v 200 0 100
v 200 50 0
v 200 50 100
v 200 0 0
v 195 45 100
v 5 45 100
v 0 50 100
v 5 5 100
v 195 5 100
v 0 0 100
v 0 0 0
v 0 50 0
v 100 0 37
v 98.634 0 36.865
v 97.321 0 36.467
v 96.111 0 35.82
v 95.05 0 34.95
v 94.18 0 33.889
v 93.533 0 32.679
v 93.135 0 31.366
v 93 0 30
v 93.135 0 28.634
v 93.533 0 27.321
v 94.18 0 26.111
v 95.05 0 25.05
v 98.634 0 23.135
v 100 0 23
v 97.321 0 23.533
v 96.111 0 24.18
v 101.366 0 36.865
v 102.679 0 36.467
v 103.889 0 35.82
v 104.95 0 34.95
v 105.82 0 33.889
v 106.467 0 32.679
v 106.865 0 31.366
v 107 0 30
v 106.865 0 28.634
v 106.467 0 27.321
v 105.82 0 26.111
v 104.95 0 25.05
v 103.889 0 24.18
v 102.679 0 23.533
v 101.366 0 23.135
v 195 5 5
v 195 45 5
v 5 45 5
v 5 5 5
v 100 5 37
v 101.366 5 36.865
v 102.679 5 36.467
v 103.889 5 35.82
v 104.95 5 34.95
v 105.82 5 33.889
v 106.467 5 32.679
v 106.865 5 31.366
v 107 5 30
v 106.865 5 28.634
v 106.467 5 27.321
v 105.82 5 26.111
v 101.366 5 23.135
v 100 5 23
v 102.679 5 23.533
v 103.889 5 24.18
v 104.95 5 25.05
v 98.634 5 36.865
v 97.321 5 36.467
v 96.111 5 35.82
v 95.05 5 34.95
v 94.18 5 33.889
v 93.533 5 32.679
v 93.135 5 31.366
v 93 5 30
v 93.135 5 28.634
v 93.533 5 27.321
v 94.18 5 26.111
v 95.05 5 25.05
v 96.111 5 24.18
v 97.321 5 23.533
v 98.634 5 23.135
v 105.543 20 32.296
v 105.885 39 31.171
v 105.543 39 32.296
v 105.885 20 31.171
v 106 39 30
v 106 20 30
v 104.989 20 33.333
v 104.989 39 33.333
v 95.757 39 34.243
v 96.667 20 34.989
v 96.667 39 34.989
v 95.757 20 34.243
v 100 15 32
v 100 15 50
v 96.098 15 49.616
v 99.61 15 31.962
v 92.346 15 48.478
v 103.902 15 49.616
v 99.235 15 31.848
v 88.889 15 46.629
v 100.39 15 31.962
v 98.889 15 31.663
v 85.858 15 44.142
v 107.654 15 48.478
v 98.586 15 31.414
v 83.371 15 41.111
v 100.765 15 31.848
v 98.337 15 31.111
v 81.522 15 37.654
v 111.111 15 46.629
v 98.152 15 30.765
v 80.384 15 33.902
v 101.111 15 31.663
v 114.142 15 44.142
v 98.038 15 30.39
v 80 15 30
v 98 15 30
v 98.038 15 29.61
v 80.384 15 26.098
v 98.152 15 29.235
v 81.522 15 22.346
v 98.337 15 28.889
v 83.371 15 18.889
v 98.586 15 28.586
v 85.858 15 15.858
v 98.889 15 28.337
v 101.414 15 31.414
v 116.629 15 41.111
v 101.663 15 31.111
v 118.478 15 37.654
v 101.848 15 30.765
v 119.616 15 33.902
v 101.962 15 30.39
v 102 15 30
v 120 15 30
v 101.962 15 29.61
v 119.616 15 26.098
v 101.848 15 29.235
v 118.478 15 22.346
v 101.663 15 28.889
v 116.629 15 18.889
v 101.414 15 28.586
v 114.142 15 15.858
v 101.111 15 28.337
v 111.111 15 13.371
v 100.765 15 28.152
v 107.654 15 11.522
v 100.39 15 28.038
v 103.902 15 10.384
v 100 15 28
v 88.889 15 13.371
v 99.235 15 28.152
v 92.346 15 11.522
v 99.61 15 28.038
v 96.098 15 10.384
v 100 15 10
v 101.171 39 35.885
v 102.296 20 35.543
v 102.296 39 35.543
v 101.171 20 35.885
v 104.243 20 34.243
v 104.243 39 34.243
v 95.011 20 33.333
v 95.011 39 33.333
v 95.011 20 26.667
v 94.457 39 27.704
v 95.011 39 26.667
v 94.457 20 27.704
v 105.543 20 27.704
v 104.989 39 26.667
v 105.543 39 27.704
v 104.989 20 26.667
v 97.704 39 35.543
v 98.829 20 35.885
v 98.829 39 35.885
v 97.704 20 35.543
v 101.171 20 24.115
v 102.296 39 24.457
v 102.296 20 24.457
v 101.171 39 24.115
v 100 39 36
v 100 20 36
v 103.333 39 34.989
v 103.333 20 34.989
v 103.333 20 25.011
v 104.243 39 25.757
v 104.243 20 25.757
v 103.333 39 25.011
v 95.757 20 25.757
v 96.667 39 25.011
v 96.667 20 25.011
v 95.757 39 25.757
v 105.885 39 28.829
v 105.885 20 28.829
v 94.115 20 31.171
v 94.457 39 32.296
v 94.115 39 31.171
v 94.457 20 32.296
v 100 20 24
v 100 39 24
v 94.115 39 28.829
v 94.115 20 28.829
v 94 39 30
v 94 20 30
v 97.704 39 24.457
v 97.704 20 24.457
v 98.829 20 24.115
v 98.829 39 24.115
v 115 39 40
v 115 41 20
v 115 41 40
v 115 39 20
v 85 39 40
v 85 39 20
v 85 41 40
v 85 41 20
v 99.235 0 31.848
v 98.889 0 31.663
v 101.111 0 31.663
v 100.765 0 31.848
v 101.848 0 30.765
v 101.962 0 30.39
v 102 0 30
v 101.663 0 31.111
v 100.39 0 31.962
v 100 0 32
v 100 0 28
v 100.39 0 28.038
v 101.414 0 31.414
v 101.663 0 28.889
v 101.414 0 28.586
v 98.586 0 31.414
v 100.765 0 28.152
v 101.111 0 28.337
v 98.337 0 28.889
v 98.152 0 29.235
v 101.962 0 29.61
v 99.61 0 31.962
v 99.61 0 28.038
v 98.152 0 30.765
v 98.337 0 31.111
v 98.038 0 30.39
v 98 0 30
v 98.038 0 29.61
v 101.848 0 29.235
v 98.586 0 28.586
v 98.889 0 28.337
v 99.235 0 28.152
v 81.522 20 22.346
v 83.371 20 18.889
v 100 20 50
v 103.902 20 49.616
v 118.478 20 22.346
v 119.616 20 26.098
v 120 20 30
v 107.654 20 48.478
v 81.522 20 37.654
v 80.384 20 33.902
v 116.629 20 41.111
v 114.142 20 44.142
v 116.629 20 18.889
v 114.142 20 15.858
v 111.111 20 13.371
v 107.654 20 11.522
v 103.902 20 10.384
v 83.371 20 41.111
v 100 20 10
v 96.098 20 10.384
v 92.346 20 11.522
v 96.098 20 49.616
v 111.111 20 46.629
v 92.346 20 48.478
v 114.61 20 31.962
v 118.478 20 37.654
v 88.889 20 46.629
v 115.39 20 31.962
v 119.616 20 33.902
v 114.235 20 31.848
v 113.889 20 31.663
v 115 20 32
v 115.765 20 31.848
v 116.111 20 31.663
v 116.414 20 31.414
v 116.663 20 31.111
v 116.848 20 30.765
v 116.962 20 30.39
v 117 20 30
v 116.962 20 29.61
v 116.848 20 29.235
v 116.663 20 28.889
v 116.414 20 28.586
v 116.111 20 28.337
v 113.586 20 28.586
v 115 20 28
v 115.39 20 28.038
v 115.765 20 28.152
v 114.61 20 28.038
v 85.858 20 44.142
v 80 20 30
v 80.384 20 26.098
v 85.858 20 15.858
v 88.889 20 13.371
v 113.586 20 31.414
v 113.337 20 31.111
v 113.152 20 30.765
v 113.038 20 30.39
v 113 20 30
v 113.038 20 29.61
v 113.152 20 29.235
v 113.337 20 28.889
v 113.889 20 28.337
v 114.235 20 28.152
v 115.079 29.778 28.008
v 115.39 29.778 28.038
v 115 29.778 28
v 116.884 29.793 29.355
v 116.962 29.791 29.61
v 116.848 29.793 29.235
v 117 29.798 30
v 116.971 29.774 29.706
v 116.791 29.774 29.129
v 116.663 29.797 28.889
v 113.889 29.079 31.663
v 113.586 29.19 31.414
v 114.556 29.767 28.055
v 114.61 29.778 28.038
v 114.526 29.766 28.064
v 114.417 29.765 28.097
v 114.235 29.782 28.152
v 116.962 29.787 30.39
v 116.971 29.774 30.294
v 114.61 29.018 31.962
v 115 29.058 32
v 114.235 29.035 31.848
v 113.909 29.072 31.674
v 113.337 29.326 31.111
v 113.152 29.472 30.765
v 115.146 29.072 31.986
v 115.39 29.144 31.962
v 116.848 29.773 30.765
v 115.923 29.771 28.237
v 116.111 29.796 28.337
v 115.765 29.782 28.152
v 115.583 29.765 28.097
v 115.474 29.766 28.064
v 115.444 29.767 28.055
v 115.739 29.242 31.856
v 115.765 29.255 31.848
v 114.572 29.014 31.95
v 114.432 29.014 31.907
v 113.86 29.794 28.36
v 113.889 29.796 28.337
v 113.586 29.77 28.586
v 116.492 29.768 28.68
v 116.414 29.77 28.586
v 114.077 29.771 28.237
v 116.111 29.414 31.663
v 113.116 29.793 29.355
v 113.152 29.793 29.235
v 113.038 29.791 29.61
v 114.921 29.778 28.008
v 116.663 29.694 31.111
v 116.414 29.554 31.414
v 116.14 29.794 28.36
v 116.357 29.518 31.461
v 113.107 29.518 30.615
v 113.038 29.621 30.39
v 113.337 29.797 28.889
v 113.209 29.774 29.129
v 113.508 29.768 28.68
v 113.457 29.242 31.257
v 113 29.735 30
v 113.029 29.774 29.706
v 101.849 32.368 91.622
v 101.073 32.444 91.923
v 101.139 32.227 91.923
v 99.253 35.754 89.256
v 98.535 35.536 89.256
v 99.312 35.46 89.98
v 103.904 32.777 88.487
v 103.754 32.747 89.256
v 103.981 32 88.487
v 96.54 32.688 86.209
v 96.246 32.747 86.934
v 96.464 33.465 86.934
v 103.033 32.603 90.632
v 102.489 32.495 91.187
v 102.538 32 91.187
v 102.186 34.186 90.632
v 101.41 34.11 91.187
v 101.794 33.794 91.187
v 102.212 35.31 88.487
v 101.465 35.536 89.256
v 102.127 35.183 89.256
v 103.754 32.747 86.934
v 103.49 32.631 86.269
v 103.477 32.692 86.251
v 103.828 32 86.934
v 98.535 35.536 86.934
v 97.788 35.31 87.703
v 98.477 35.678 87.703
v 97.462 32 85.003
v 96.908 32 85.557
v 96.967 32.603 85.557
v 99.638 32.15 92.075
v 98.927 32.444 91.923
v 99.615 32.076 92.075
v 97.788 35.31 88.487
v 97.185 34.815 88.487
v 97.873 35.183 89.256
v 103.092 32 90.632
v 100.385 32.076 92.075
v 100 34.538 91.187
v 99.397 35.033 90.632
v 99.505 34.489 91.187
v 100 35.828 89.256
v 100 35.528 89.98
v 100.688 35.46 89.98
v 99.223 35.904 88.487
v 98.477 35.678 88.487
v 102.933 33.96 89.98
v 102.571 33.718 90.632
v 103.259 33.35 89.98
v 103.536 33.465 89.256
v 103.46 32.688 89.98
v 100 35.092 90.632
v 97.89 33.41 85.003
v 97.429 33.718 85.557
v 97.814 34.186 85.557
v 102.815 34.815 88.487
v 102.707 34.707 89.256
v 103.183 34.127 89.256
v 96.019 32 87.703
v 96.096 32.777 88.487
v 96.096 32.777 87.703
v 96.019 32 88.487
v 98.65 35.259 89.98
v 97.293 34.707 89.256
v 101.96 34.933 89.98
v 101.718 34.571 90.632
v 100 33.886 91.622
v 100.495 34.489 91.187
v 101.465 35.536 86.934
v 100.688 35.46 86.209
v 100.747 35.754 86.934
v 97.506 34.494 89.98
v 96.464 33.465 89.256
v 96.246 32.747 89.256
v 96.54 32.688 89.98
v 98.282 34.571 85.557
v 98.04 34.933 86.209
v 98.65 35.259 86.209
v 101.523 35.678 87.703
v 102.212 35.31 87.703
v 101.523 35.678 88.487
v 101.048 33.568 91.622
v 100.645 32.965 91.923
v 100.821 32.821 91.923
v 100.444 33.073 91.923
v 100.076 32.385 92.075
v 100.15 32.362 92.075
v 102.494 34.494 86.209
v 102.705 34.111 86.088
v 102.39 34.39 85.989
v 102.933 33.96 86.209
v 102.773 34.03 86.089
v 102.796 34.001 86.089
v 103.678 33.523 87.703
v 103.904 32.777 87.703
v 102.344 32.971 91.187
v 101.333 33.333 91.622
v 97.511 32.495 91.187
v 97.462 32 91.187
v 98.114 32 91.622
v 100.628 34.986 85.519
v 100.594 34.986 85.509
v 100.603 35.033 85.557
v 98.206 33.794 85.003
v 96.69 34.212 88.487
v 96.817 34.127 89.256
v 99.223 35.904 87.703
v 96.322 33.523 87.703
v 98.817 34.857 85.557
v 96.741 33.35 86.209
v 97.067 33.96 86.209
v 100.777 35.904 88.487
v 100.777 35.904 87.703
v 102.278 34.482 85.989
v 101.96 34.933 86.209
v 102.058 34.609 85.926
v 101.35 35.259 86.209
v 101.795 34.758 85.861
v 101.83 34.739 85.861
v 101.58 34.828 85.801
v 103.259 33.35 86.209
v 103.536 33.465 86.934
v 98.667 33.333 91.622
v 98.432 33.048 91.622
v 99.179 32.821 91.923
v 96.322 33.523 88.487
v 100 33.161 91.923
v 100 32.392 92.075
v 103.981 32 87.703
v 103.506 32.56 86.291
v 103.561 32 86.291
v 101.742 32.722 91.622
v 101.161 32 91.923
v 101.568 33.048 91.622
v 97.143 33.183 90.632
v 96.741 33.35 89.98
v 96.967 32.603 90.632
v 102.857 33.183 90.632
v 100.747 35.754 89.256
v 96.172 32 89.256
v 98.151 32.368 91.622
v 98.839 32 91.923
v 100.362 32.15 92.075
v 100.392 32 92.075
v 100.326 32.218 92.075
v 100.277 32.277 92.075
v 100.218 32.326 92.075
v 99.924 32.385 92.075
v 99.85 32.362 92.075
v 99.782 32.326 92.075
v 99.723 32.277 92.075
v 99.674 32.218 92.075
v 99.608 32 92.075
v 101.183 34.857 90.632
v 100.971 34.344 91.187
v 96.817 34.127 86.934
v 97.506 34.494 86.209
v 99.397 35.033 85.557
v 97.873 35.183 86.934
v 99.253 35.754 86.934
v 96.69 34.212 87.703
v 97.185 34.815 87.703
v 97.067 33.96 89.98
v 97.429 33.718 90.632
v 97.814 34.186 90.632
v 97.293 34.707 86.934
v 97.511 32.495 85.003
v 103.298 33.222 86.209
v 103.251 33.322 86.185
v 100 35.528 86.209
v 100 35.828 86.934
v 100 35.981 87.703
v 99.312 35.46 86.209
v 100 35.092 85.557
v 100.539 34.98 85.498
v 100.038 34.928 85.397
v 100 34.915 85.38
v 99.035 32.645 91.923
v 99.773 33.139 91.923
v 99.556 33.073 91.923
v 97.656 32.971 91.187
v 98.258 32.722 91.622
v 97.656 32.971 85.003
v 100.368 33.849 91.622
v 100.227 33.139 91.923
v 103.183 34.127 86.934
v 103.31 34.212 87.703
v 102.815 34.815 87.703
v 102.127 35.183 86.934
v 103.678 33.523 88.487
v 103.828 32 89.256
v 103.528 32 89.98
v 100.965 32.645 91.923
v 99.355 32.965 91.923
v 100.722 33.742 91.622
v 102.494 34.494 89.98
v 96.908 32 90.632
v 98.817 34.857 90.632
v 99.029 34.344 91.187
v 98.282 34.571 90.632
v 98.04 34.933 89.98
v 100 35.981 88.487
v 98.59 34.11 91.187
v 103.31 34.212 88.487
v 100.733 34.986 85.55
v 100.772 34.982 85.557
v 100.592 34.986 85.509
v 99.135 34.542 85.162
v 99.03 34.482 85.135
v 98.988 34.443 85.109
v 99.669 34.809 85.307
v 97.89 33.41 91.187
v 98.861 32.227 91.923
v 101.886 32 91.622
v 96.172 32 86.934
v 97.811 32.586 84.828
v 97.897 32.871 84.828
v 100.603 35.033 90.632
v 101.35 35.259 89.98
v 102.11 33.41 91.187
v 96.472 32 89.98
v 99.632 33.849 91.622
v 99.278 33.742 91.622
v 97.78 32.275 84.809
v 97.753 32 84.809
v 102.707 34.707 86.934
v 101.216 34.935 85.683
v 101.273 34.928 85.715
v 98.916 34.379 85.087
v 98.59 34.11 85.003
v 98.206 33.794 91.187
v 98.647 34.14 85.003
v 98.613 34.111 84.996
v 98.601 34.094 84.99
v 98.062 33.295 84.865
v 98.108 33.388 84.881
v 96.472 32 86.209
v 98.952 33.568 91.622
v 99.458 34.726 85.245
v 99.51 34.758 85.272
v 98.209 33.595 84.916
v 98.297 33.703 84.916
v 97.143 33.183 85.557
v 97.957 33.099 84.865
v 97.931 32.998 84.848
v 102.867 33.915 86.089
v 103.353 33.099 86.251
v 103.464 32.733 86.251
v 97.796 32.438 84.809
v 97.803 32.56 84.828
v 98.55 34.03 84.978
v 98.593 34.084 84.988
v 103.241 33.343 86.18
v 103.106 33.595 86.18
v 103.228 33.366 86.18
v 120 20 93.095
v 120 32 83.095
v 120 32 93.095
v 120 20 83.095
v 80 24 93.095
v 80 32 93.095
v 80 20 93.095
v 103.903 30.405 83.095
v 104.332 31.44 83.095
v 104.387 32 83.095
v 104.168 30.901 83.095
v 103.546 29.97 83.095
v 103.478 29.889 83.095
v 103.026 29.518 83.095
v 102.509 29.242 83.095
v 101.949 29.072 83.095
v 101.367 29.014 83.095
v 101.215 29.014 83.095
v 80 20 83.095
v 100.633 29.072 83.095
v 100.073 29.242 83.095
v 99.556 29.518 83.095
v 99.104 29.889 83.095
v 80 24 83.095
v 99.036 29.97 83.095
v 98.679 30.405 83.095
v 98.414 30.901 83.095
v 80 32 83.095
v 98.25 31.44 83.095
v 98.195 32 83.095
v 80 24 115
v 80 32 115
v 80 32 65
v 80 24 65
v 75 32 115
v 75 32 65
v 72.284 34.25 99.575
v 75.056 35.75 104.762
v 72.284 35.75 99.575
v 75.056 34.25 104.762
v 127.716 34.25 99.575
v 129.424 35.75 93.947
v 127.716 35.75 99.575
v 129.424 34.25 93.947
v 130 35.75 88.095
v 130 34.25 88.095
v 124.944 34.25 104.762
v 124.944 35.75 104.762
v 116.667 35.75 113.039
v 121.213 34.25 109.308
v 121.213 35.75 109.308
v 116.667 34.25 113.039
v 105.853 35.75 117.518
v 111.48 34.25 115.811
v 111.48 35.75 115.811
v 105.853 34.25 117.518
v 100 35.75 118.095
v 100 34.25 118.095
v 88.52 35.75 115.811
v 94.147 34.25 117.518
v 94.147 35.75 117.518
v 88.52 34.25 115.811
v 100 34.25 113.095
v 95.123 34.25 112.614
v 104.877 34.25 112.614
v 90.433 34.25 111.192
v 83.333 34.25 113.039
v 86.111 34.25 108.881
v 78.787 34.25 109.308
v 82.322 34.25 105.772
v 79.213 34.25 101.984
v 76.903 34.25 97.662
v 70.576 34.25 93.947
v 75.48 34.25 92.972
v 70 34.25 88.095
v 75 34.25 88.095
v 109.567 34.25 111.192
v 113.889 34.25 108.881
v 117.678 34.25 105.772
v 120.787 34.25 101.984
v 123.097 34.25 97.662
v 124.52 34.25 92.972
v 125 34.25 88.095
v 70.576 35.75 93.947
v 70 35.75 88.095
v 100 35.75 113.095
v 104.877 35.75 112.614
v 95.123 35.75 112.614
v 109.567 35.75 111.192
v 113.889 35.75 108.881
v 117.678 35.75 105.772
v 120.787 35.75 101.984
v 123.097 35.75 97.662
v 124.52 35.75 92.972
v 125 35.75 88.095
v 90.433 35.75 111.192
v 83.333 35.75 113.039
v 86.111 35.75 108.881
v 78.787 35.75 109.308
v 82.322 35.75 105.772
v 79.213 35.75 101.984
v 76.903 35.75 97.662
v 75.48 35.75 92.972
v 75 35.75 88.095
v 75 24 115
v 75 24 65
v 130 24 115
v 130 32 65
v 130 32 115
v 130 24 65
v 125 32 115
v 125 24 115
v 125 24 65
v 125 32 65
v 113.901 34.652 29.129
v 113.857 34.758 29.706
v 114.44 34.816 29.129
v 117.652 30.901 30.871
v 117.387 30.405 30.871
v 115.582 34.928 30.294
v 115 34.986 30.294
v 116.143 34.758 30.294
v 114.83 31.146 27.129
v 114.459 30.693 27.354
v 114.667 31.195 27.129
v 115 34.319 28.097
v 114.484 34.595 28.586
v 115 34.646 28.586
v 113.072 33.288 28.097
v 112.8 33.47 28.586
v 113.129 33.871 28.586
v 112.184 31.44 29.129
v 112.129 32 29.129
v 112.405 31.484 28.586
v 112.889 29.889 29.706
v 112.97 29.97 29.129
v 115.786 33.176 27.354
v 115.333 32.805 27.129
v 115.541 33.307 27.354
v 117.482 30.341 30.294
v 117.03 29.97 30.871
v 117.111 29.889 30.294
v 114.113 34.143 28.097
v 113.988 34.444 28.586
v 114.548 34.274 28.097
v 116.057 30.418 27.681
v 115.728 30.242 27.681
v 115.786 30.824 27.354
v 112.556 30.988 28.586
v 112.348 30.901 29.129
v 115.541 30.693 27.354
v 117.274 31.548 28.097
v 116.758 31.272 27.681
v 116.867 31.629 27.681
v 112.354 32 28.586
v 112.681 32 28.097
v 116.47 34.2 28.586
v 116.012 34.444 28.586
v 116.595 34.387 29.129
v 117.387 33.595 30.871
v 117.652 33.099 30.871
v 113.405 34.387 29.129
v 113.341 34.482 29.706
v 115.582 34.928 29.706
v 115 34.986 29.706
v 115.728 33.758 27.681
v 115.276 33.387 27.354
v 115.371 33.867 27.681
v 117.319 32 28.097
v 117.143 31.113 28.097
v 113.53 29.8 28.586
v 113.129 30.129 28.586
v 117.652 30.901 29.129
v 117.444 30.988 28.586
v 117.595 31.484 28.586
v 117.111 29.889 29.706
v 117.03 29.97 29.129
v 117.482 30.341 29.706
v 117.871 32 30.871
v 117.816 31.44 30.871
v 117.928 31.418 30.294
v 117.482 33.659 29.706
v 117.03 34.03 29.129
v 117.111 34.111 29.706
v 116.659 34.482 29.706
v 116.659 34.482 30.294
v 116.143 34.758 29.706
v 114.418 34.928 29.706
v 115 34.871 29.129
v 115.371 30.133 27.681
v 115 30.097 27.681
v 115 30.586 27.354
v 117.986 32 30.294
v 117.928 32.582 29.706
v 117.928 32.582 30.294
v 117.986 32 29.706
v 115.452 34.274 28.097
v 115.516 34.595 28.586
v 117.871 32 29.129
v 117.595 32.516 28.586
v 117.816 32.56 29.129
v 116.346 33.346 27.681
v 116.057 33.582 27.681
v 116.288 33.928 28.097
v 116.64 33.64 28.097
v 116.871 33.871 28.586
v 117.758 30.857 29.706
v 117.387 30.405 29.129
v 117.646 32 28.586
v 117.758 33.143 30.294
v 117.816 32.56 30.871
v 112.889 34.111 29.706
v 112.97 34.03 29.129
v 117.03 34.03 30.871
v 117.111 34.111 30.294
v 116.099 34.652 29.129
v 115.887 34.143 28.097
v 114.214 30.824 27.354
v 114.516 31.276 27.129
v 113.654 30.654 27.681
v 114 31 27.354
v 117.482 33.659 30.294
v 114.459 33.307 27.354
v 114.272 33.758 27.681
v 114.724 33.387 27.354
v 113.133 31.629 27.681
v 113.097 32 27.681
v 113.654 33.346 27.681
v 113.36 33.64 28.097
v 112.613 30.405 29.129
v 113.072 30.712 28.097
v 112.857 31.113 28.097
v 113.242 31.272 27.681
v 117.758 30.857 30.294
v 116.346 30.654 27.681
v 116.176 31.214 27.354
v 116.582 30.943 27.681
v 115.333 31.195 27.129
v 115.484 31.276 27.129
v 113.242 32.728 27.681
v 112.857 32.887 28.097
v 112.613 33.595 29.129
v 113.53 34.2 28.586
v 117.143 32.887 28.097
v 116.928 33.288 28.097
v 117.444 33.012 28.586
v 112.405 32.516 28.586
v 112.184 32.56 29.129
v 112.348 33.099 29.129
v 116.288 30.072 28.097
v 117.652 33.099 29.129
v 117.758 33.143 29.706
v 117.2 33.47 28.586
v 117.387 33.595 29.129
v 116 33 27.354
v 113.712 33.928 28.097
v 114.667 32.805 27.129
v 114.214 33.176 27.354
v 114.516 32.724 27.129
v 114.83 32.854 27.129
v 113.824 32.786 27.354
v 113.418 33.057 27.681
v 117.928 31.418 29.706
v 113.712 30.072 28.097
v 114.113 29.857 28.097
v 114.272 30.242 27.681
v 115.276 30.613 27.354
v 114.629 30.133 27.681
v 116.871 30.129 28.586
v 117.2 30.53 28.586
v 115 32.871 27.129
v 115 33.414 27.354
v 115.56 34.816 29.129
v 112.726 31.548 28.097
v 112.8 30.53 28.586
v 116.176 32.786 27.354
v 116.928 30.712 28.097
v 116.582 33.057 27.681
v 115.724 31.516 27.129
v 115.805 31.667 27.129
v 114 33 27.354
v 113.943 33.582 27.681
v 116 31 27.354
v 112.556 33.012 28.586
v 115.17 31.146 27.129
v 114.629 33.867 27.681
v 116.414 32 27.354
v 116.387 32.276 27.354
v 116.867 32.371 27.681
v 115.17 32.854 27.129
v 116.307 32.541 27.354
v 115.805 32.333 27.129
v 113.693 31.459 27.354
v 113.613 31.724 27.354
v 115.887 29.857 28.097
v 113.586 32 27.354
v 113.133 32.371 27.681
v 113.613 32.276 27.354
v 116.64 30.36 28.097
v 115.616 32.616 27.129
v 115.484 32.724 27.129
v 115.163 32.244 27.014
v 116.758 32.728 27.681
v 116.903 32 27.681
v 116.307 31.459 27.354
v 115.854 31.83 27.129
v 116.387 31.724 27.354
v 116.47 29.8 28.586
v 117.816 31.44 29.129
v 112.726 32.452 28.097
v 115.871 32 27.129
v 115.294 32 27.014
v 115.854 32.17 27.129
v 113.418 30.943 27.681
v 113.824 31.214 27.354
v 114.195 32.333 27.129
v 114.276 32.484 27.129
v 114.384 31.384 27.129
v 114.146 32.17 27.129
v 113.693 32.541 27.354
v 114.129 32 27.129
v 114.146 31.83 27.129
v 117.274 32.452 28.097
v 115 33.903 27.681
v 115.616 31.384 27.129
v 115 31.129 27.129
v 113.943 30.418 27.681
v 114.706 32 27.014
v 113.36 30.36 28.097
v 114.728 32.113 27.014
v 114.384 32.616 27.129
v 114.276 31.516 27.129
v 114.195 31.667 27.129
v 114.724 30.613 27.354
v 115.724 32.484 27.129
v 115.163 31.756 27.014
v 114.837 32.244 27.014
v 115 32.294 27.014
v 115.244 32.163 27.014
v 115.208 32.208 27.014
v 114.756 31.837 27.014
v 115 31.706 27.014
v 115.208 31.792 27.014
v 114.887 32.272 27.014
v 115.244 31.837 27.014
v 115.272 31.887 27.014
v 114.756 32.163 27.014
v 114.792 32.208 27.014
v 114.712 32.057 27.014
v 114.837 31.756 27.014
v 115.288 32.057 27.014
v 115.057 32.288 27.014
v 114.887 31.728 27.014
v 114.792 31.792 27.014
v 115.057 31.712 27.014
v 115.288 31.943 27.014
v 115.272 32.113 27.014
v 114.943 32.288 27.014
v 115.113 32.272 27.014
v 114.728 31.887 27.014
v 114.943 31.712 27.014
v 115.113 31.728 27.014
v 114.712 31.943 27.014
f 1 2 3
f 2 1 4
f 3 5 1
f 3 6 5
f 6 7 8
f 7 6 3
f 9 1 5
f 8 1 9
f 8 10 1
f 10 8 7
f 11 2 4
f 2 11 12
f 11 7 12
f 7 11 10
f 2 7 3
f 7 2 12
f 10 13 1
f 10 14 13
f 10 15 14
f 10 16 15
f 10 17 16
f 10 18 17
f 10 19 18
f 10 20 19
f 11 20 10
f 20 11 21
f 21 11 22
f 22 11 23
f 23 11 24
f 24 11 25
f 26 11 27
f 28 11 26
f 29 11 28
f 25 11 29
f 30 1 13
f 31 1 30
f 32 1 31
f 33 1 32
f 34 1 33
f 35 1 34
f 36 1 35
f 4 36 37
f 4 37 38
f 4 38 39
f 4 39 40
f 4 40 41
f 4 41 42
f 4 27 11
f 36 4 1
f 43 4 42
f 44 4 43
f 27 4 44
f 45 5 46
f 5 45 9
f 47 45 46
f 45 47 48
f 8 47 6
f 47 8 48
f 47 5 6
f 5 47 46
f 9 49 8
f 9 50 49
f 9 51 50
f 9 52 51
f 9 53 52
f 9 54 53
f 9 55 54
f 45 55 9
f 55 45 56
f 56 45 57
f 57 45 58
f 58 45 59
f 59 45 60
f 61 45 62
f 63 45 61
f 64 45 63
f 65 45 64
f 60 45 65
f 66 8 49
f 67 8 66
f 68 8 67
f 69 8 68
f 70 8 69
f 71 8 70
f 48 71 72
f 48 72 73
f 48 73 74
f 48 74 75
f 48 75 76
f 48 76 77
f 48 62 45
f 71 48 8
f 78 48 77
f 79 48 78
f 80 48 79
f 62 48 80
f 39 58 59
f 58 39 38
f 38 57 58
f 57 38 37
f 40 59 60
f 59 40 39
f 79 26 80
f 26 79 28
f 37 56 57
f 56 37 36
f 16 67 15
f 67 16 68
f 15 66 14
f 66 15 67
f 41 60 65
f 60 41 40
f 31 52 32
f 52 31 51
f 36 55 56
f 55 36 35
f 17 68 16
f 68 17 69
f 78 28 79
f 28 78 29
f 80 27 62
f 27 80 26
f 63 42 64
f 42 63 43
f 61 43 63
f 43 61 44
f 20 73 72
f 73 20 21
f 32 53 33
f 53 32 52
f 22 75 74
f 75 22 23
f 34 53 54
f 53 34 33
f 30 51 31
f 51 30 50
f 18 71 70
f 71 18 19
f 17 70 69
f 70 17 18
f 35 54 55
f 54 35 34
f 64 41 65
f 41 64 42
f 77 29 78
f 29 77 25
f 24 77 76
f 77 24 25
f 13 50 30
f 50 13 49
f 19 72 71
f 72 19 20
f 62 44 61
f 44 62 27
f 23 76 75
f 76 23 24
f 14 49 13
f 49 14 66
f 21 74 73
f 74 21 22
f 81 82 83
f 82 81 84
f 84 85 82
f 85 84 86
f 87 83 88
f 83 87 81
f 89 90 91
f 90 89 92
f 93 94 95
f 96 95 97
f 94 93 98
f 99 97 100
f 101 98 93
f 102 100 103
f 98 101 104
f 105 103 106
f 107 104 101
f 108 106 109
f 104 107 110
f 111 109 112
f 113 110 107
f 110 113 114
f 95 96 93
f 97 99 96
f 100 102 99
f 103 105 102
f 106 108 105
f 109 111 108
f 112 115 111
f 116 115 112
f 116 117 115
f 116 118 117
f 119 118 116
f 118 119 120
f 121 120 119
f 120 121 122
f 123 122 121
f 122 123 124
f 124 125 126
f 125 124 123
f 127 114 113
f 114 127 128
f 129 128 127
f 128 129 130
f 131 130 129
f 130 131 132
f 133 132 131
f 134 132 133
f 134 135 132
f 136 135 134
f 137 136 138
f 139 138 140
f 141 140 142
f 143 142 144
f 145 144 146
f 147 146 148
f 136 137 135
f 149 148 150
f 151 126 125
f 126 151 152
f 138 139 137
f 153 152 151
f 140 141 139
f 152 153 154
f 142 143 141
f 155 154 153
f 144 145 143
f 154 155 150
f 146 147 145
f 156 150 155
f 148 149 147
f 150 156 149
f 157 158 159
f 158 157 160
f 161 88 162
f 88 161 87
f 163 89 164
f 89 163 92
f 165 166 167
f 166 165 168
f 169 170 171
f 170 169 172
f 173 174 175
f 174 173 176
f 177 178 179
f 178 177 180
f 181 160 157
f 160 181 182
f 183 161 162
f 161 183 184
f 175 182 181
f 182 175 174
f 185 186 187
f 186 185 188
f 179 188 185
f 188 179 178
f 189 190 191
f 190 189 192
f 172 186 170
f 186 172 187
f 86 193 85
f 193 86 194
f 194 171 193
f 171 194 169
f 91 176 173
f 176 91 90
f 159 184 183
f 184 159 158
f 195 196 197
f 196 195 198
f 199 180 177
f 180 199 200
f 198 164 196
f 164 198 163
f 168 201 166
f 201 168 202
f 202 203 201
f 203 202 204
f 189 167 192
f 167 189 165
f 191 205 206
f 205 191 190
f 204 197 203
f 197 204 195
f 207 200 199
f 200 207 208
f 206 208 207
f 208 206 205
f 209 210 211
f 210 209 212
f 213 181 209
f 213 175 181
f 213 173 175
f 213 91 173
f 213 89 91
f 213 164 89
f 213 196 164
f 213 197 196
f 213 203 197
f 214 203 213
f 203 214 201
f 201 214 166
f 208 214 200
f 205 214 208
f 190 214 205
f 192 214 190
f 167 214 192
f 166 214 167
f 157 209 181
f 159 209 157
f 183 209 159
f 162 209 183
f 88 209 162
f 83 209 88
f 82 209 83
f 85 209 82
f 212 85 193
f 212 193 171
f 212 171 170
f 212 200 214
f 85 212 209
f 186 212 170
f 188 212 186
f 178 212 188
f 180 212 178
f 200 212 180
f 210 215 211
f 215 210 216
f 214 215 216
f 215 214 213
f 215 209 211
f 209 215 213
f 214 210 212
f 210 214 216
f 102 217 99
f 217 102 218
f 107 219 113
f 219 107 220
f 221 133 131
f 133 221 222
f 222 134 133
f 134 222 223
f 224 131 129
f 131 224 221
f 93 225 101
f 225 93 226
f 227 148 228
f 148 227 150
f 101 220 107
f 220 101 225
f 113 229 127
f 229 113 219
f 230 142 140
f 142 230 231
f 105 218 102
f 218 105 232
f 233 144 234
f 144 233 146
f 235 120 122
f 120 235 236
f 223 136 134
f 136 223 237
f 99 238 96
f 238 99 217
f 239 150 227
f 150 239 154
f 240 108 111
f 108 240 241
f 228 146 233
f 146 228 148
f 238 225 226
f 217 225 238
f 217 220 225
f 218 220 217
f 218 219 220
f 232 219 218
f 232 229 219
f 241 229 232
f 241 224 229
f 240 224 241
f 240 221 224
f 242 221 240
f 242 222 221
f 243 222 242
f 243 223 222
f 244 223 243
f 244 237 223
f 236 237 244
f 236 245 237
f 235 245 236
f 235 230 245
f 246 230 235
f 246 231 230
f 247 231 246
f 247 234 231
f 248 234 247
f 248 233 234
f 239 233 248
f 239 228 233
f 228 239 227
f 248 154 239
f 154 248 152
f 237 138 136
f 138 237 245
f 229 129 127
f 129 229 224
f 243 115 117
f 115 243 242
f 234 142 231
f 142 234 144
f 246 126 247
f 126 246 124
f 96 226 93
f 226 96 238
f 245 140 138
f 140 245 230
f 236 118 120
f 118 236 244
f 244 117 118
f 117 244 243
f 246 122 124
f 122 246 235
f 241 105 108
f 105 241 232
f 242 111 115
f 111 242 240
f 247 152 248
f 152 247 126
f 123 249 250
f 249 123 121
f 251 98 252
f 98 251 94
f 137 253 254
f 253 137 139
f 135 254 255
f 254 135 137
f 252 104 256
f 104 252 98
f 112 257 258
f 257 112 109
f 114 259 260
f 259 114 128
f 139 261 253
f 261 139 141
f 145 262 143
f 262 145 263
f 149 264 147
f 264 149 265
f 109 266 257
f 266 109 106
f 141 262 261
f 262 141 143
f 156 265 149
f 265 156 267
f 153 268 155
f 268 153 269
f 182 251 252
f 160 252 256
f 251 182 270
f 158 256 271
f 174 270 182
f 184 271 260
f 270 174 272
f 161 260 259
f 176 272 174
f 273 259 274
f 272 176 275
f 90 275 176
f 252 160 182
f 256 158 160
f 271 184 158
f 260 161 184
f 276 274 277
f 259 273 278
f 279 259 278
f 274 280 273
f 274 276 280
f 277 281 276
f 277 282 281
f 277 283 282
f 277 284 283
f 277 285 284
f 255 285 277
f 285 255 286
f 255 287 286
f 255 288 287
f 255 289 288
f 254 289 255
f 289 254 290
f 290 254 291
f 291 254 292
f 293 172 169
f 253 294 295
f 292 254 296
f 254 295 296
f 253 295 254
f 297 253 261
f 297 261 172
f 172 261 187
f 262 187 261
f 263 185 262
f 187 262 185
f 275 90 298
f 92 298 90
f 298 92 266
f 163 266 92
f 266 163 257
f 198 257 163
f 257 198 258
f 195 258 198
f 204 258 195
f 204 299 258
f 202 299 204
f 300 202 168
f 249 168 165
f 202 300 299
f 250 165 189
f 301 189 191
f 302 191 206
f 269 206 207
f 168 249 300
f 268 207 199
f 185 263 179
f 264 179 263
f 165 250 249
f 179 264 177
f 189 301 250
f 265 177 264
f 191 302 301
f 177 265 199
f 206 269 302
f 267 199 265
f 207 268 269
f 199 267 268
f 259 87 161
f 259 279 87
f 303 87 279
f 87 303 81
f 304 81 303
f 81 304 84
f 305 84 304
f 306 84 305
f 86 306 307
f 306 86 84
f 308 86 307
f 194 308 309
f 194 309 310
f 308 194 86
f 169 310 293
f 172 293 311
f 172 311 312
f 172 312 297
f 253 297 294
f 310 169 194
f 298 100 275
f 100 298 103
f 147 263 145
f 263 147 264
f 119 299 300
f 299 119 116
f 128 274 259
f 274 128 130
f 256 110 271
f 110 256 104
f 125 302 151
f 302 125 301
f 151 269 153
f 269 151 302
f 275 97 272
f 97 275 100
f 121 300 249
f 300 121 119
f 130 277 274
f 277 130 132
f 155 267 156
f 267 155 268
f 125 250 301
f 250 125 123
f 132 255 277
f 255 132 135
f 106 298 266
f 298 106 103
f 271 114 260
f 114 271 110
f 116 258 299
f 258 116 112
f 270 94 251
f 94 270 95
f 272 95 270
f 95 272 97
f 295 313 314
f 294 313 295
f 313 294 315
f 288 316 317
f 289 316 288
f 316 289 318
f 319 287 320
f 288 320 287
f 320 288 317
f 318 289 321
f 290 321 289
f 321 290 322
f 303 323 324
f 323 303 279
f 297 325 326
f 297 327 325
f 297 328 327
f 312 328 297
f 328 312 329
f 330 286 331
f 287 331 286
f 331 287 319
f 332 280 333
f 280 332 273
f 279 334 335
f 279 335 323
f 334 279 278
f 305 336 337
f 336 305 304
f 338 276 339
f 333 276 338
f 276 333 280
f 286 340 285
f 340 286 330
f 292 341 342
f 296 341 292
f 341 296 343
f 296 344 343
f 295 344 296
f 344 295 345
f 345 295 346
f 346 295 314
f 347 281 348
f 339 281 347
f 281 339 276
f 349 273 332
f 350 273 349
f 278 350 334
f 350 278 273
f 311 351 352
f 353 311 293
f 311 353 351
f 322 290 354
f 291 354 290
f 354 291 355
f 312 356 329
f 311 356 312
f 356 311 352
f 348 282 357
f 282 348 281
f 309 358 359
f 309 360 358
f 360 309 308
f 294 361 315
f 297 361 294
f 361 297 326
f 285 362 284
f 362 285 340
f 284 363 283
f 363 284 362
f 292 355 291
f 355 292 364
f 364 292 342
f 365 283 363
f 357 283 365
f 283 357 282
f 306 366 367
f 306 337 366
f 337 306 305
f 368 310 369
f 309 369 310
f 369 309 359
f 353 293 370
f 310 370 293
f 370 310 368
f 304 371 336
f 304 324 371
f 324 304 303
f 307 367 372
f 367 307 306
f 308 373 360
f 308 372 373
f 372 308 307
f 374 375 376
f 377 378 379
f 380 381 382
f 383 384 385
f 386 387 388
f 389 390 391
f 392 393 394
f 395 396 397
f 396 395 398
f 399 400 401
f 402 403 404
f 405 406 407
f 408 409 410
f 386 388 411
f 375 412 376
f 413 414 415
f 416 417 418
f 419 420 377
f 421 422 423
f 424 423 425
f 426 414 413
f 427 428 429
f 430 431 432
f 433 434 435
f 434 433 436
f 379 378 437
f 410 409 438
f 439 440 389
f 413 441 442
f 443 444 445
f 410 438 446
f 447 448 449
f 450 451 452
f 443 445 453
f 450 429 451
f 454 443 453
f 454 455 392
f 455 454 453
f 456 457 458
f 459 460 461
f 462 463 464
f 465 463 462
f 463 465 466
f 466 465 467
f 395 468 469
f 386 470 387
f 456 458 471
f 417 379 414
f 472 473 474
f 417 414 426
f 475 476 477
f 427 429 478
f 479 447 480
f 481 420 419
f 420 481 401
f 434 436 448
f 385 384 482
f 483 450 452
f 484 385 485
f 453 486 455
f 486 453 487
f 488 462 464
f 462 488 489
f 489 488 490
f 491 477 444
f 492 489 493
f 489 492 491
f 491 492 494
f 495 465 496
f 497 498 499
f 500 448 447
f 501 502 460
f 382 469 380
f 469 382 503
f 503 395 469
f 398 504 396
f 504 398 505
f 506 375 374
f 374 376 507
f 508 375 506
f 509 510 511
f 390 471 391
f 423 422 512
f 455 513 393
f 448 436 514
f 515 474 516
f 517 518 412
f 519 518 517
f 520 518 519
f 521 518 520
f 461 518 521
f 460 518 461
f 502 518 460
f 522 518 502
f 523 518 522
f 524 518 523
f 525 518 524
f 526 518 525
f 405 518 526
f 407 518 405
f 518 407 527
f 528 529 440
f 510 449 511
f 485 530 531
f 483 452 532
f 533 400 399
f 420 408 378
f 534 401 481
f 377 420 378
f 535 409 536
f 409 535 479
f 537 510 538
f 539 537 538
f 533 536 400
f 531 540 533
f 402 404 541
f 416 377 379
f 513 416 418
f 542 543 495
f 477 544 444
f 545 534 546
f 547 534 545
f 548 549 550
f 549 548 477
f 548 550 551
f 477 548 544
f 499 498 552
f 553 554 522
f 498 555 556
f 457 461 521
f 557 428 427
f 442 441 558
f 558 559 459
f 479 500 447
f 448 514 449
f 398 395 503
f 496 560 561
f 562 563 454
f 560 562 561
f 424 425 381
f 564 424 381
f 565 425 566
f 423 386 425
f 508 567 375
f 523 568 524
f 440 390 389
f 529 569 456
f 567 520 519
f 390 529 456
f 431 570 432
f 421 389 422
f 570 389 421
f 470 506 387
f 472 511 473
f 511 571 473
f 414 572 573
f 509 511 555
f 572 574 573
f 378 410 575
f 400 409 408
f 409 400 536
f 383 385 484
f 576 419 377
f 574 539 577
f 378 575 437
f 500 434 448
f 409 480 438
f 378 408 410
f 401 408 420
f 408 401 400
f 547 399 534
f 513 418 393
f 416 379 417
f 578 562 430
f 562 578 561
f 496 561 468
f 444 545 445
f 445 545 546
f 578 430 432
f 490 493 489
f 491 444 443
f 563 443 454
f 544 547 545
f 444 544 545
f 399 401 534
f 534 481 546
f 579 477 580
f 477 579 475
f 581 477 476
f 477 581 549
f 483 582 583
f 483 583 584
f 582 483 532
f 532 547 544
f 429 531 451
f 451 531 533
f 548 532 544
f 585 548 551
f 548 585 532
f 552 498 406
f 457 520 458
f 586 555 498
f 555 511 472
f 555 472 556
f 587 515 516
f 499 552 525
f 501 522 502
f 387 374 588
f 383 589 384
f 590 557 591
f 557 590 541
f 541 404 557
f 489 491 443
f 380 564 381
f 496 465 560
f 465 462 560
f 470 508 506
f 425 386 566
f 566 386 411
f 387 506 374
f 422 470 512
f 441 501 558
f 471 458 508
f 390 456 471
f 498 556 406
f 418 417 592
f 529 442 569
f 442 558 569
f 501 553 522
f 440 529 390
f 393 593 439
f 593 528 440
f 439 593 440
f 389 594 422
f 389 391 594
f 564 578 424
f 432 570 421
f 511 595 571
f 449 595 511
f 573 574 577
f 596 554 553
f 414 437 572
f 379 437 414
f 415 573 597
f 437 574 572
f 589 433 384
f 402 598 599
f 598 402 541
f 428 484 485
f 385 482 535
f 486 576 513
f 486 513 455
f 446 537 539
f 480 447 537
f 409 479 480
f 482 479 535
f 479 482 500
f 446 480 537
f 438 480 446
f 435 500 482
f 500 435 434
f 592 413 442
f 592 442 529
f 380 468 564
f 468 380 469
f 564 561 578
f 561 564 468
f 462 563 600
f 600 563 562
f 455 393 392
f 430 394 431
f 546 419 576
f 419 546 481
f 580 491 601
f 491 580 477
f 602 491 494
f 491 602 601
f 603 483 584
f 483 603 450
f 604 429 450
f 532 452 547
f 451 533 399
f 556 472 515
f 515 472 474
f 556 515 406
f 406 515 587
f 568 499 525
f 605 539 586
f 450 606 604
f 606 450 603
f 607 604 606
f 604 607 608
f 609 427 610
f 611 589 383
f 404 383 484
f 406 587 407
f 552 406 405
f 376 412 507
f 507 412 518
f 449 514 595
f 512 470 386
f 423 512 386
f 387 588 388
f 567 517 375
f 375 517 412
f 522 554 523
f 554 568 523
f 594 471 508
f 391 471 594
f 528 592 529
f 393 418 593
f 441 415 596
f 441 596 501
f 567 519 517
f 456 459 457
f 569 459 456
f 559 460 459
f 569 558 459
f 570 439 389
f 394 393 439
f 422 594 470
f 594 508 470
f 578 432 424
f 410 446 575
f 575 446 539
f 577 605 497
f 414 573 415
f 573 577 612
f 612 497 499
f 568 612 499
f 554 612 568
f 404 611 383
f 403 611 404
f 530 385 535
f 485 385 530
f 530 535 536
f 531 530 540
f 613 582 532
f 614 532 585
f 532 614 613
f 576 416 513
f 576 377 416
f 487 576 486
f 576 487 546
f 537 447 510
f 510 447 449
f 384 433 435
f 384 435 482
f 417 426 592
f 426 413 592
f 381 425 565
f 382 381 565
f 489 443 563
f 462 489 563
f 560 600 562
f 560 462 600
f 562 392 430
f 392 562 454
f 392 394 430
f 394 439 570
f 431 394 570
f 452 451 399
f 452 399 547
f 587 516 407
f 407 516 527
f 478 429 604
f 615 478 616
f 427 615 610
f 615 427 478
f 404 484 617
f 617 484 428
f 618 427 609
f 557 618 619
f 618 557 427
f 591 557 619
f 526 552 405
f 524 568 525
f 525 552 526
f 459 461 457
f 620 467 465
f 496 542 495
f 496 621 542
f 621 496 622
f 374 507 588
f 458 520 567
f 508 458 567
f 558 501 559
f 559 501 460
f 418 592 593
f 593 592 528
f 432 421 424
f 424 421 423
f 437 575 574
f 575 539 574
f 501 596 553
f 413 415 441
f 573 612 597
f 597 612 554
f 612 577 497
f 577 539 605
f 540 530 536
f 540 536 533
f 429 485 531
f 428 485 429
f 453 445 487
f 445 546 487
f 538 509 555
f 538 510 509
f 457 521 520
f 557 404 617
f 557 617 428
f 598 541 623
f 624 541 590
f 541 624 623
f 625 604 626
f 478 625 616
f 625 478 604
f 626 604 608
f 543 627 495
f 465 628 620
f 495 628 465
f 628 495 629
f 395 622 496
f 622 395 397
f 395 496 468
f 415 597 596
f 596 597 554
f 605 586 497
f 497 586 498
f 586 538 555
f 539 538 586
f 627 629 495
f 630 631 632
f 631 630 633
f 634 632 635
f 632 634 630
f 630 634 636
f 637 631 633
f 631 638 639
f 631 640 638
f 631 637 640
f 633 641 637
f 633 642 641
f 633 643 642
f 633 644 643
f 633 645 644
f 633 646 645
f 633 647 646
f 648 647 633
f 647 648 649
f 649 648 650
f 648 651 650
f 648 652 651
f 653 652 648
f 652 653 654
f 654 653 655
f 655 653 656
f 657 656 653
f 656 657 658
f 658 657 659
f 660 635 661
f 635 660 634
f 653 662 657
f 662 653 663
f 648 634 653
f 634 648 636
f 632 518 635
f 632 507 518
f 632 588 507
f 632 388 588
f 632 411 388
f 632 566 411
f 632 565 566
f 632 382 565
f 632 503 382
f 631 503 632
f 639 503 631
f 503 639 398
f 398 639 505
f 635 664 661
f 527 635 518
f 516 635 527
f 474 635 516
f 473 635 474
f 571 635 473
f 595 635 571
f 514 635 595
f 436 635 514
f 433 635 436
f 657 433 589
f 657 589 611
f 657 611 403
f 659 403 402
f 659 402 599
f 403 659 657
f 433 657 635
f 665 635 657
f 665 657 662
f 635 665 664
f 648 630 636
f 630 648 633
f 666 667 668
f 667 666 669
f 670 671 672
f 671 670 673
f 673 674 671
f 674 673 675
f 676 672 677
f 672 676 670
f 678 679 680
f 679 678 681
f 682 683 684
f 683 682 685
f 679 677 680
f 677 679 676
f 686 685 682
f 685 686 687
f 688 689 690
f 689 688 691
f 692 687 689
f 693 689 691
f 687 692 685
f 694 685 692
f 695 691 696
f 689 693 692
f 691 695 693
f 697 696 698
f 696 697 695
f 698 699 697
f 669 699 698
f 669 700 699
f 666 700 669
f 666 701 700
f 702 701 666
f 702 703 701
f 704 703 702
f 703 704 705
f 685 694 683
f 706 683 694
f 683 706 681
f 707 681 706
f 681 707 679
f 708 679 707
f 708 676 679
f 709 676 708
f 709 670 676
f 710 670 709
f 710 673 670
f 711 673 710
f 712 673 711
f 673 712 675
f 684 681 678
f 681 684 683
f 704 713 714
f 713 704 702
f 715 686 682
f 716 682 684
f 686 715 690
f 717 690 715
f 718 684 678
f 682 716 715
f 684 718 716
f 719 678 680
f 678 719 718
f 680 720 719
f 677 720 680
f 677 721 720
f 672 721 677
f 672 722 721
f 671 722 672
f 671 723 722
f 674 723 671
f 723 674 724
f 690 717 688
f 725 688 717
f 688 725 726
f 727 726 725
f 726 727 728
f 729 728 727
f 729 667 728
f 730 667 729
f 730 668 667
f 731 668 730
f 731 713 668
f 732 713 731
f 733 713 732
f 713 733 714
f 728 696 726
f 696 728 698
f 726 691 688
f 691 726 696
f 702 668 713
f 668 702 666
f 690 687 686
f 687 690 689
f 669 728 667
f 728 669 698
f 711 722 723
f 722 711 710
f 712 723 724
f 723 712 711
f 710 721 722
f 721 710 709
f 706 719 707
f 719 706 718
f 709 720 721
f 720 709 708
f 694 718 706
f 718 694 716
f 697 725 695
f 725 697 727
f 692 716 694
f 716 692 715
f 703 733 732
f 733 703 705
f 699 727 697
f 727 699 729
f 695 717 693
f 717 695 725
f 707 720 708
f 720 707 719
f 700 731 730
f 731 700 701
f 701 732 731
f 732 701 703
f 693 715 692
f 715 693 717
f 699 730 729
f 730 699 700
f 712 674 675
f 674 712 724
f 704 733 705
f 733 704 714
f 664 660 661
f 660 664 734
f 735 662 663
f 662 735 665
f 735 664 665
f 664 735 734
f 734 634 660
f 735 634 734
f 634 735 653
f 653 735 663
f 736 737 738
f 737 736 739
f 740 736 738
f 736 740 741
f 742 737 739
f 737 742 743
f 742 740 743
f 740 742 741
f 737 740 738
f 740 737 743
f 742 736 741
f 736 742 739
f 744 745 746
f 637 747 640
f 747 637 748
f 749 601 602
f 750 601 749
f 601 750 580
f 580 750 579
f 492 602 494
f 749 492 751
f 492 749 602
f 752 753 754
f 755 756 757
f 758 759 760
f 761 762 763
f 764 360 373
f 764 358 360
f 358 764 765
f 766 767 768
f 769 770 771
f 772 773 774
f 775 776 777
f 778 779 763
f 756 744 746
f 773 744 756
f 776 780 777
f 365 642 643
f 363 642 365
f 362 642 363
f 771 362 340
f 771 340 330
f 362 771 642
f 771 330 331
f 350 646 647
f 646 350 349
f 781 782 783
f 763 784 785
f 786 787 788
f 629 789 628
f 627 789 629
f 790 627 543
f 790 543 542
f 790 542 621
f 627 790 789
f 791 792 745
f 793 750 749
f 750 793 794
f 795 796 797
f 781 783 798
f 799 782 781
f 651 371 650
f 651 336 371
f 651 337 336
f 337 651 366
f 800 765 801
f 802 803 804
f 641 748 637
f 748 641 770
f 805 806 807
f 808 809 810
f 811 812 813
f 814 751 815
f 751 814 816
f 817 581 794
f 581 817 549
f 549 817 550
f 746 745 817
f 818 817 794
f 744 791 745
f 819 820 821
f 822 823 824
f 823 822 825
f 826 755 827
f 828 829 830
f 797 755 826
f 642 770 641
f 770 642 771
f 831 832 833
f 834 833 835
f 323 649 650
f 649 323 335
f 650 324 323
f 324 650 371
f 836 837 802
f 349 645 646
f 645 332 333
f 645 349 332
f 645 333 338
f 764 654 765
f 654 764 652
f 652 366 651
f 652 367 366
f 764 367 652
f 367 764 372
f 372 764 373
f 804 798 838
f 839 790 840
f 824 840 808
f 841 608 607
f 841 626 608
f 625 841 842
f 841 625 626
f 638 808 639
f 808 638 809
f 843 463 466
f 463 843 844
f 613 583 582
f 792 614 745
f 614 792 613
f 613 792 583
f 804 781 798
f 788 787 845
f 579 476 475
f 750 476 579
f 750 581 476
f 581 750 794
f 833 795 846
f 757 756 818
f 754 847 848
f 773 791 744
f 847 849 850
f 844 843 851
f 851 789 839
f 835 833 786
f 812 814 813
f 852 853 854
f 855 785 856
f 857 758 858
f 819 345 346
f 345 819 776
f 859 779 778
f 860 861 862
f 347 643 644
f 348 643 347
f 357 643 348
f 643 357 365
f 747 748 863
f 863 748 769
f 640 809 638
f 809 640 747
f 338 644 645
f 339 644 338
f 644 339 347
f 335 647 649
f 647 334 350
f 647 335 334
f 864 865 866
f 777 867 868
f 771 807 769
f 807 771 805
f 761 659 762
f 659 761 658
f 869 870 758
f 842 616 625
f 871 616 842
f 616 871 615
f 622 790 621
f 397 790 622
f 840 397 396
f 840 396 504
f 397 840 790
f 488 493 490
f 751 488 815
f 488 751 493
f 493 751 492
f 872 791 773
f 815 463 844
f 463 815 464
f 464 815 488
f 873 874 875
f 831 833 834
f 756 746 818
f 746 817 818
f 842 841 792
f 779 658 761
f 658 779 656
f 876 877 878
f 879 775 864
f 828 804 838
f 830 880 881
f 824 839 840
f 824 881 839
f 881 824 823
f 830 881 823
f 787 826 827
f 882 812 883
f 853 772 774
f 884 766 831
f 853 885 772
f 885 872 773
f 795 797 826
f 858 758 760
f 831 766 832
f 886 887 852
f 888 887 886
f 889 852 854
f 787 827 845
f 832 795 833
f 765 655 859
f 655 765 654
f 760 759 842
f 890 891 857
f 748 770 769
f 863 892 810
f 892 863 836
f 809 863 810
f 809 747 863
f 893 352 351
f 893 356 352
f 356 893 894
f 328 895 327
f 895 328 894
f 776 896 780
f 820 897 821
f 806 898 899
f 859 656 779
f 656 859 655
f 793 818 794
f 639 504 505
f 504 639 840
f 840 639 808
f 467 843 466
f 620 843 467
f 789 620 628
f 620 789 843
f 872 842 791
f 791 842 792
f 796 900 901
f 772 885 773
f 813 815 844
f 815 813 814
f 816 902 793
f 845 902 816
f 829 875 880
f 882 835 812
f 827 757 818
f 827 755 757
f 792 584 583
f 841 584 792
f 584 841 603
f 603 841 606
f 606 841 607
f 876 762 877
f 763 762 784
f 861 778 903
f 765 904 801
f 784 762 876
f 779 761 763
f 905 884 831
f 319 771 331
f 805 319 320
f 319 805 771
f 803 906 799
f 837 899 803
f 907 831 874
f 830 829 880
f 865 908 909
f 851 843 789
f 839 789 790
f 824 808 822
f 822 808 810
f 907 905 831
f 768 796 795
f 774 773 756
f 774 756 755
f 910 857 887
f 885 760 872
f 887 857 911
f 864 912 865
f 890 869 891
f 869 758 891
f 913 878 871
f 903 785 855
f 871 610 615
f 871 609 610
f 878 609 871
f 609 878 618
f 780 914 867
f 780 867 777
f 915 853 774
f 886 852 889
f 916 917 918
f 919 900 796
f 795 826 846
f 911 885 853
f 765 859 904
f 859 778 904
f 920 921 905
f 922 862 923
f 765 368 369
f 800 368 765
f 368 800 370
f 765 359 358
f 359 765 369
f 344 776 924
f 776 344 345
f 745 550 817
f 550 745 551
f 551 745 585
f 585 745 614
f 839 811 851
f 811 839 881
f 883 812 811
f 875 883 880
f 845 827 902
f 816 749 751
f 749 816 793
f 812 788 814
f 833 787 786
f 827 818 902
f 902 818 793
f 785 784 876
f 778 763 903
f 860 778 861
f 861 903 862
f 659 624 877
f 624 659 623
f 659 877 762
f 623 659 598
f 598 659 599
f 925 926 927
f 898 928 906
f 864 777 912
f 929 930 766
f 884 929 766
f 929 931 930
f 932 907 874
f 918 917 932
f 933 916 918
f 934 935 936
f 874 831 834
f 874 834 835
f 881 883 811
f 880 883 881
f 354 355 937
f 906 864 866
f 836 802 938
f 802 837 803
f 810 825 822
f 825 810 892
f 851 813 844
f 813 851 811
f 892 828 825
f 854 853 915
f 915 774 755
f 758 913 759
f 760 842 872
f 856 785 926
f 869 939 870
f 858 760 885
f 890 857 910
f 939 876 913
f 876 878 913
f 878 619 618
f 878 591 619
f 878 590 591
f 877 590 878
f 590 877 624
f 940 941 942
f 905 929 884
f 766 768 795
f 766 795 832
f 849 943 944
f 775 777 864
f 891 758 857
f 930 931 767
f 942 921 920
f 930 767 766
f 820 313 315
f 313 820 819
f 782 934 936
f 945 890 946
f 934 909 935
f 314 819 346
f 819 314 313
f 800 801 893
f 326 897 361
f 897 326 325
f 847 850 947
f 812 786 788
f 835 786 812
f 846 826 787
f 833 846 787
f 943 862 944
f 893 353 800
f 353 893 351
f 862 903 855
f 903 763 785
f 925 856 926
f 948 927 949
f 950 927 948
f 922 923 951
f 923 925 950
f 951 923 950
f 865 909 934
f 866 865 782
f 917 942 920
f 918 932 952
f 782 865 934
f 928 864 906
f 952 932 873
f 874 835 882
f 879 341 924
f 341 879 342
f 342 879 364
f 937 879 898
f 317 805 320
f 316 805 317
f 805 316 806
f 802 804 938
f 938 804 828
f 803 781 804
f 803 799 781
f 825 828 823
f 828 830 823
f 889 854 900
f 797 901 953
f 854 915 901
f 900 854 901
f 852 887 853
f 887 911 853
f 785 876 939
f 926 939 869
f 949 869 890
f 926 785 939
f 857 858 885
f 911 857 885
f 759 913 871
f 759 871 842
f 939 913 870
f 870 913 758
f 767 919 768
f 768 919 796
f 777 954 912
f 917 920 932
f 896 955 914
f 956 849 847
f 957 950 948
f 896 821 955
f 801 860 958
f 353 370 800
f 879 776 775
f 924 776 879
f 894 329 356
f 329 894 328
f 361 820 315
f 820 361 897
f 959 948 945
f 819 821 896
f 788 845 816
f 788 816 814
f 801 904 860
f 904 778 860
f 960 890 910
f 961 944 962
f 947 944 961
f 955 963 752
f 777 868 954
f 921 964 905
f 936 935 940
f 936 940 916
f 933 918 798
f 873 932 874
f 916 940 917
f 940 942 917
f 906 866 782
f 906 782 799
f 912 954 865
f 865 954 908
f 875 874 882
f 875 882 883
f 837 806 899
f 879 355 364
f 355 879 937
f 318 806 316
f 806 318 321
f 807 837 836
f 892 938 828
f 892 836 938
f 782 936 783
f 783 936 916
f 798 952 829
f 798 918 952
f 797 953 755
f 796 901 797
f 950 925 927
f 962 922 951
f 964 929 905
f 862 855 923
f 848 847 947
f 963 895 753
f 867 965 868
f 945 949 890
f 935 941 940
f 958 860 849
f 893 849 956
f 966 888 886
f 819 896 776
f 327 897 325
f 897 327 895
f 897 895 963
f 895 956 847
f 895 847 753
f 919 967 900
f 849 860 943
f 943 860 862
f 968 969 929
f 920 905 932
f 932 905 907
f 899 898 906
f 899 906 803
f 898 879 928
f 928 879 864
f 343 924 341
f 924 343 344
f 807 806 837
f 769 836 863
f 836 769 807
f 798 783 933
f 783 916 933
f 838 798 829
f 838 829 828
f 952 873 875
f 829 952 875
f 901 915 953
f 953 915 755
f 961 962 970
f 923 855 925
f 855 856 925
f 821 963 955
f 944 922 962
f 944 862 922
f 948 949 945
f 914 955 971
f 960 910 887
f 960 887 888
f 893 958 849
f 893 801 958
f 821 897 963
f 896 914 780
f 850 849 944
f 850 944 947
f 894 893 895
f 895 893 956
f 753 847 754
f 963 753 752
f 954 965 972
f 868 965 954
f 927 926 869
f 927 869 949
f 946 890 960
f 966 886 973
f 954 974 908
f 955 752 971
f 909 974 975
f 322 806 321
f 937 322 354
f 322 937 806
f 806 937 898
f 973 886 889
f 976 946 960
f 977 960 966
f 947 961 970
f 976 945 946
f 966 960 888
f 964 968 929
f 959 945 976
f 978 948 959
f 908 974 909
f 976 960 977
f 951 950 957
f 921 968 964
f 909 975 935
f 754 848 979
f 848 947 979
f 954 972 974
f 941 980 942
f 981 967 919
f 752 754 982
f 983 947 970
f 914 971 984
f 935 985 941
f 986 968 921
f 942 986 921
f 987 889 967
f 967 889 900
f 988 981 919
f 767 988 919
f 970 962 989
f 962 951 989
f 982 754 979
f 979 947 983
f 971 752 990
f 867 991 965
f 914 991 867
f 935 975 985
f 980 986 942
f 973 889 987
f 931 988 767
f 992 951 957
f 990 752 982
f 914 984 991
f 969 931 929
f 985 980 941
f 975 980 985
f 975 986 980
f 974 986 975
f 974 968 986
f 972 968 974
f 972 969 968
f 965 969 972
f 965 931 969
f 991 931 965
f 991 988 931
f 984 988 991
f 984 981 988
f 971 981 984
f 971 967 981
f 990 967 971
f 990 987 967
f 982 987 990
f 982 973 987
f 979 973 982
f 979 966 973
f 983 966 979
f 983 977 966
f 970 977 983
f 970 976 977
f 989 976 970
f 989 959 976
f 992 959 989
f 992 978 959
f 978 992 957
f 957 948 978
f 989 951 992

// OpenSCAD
// ═══════════════════════════════════════════════════════════════════════════
//                    SINGLE WAVE MECHANISM v1
//                    One crank, one wave, actually connected
// ═══════════════════════════════════════════════════════════════════════════
// This file demonstrates a WORKING slider-crank mechanism where:
//   - Every part position derives from the motor shaft
//   - Coupler rod physically connects crank pin to slider
//   - No floating parts, no orphan animations
// ═══════════════════════════════════════════════════════════════════════════

$fn = 32;

// ═══════════════════════════════════════════════════════════════════════════
//                          SINGLE SOURCE OF TRUTH
// ═══════════════════════════════════════════════════════════════════════════
// All positions derive from these values

// Frame dimensions
FRAME_W = 200;
FRAME_H = 100;
FRAME_D = 50;
WALL = 5;

// Motor position (the ONLY fixed reference)
MOTOR_X = FRAME_W / 2;  // 100mm - center of frame
MOTOR_Y = 15;           // 15mm from back panel
MOTOR_Z = 30;           // 30mm up from bottom

// Mechanism parameters (from calculations)
CRANK_R = 15;           // Crank radius (mm)
COUPLER_L = 60;         // Coupler length (mm) - MUST stay constant
PIN_D = 4;              // Pin diameter
ROD_D = 6;              // Coupler rod diameter

// Animation
angle = $t * 360;       // Crank rotation (degrees)

// ═══════════════════════════════════════════════════════════════════════════
//                          DERIVED POSITIONS
// ═══════════════════════════════════════════════════════════════════════════
// These are CALCULATED from motor position + angle, not independently set

// Crank pin position (rotates around motor shaft)
function pin_x(a) = MOTOR_X + CRANK_R * cos(a);
function pin_z(a) = MOTOR_Z + CRANK_R * sin(a);

// CRITICAL GEOMETRY for collision avoidance:
//
// The crank disc rotates in the X-Z plane at Y = MOTOR_Y to Y = MOTOR_Y + thickness
// The pin sticks out in the +Y direction from the disc face
// The coupler rod connects pin tip to slider
//
// To avoid collision: the ENTIRE coupler rod must be at Y > disc_front_face
// This means BOTH the pin tip AND the slider must be at the same Y, in front of disc
//
CRANK_DISC_THICKNESS = 5;
PIN_LENGTH = 12;  // Longer pin to get connection point further from disc

// Pin tip Y position (where coupler connects to crank)
PIN_TIP_Y = MOTOR_Y + CRANK_DISC_THICKNESS + PIN_LENGTH;  // 15 + 5 + 12 = 32mm

// Slider Y position - SAME as pin tip so rod stays in one Y plane, clear of disc
SLIDER_Y = PIN_TIP_Y;  // 32mm - entirely in front of disc (which ends at Y=20)

// Slider position (constrained to move vertically below motor)
function slider_z(a) =
    let(
        pz = pin_z(a),
        horiz = CRANK_R * cos(a),
        vert_from_pin = sqrt(COUPLER_L * COUPLER_L - horiz * horiz)
    )
    pz + vert_from_pin;

// ═══════════════════════════════════════════════════════════════════════════
//                          COLORS
// ═══════════════════════════════════════════════════════════════════════════
C_FRAME = [0.3, 0.3, 0.35];
C_MOTOR = [0.2, 0.2, 0.2];
C_CRANK = [0.8, 0.4, 0.1];
C_ROD = [0.6, 0.6, 0.65];
C_SLIDER = [0.2, 0.5, 0.8];
C_WAVE = [0.1, 0.4, 0.7];

// ═══════════════════════════════════════════════════════════════════════════
//                          FRAME MODULE
// ═══════════════════════════════════════════════════════════════════════════
module frame() {
    color(C_FRAME)
    difference() {
        // Outer shell
        cube([FRAME_W, FRAME_D, FRAME_H]);

        // Hollow interior
        translate([WALL, WALL, WALL])
            cube([FRAME_W - 2*WALL, FRAME_D - 2*WALL, FRAME_H]);

        // Motor hole in back panel
        translate([MOTOR_X, -1, MOTOR_Z])
            rotate([-90, 0, 0])
            cylinder(d = 14, h = WALL + 2);

        // Slider rail slot (vertical slot for slider to move in)
        translate([MOTOR_X - 6, 20, 60])
            cube([12, 20, 50]);
    }
}

// ═══════════════════════════════════════════════════════════════════════════
//                          MOTOR MODULE
// ═══════════════════════════════════════════════════════════════════════════
module motor() {
    color(C_MOTOR)
    translate([MOTOR_X, MOTOR_Y, MOTOR_Z])
    rotate([90, 0, 0]) {
        // Motor body
        translate([0, 0, -25])
            cylinder(d = 12, h = 25);

        // Motor mount plate
        translate([-15, -10, -26])
            cube([30, 20, 2]);

        // Shaft (extends forward)
        cylinder(d = 4, h = 15);
    }
}

// ═══════════════════════════════════════════════════════════════════════════
//                          CRANK DISC MODULE
// ═══════════════════════════════════════════════════════════════════════════
module crank_disc(a) {
    color(C_CRANK)
    translate([MOTOR_X, MOTOR_Y, MOTOR_Z])
    rotate([-90, 0, 0])
    rotate([0, 0, a]) {
        // Disc rotates in X-Z plane, faces +Y direction
        // Disc spans Y = MOTOR_Y (15) to Y = MOTOR_Y + thickness (20)
        cylinder(d = CRANK_R * 2 + 10, h = CRANK_DISC_THICKNESS);

        // Hub
        cylinder(d = 10, h = CRANK_DISC_THICKNESS + 2);

        // Pin at crank radius - extends from disc face toward +Y
        // Pin spans Y = 20 to Y = 20 + PIN_LENGTH (32)
        // Coupler connects at pin tip (Y = 32), well clear of disc
        translate([CRANK_R, 0, CRANK_DISC_THICKNESS])
            cylinder(d = PIN_D, h = PIN_LENGTH);
    }
}

// ═══════════════════════════════════════════════════════════════════════════
//                          COUPLER ROD MODULE
// ═══════════════════════════════════════════════════════════════════════════
// This is the KEY module - it PHYSICALLY connects the pin to the slider
module coupler_rod(a) {
    // Calculate positions
    px = pin_x(a);
    pz = pin_z(a);
    sz = slider_z(a);

    color(C_ROD)
    hull() {
        // Ball joint at crank pin
        translate([px, PIN_TIP_Y, pz])
            sphere(d = ROD_D);

        // Ball joint at slider
        translate([MOTOR_X, PIN_TIP_Y, sz])
            sphere(d = ROD_D);
    }

    // Debug: verify coupler length
    coupler_actual = sqrt(pow(px - MOTOR_X, 2) + pow(sz - pz, 2));
    echo(str("Angle: ", a, "° | Coupler length: ", coupler_actual, "mm (should be ", COUPLER_L, ")"));
}

// ═══════════════════════════════════════════════════════════════════════════
//                          SLIDER MODULE
// ═══════════════════════════════════════════════════════════════════════════
module slider(a) {
    sz = slider_z(a);

    color(C_SLIDER)
    translate([MOTOR_X, SLIDER_Y, sz]) {
        // Connection point at SLIDER_Y (same as PIN_TIP_Y = 32mm)
        // This keeps the entire coupler rod at Y=32, clear of disc at Y=20
        sphere(d = 8);

        // Slider block - extends backward from connection point
        translate([-20, -12, -5])
            cube([40, 12, 10]);
    }
}

// ═══════════════════════════════════════════════════════════════════════════
//                          WAVE PIECE MODULE
// ═══════════════════════════════════════════════════════════════════════════
module wave_piece(a) {
    sz = slider_z(a);

    color(C_WAVE)
    translate([MOTOR_X, SLIDER_Y + 3, sz]) {
        // Wave shape - attached to front of slider
        scale([1, 0.3, 1])
        rotate([90, 0, 0])
        difference() {
            cylinder(d = 60, h = 5, center = true);
            cylinder(d = 50, h = 6, center = true);
            translate([-40, -40, -5])
                cube([80, 40, 10]);
        }
    }
}

// ═══════════════════════════════════════════════════════════════════════════
//                          RAIL GUIDES MODULE
// ═══════════════════════════════════════════════════════════════════════════
module rail_guides() {
    color(C_FRAME)
    for (dx = [-25, 25]) {
        // Rails at SLIDER_Y to guide vertical motion
        translate([MOTOR_X + dx, SLIDER_Y - 8, 65])
            cube([5, 8, 50]);
    }
}

// ═══════════════════════════════════════════════════════════════════════════
//                          MAIN ASSEMBLY
// ═══════════════════════════════════════════════════════════════════════════
// Everything is connected through the angle parameter

frame();
motor();
crank_disc(angle);
coupler_rod(angle);
slider(angle);
wave_piece(angle);
rail_guides();

// ═══════════════════════════════════════════════════════════════════════════
//                          DEBUG OUTPUT
// ═══════════════════════════════════════════════════════════════════════════
echo("═══════════════════════════════════════════════════════════════════");
echo("SINGLE WAVE MECHANISM v1 - Geometry Verification");
echo("═══════════════════════════════════════════════════════════════════");
echo(str("Disc Y range: ", MOTOR_Y, " to ", MOTOR_Y + CRANK_DISC_THICKNESS, " (ends at Y=20)"));
echo(str("Pin tip Y: ", PIN_TIP_Y, " (coupler connects here)"));
echo(str("Slider Y: ", SLIDER_Y, " (same as pin tip)"));
echo(str("Clearance: ", PIN_TIP_Y - (MOTOR_Y + CRANK_DISC_THICKNESS), "mm between disc and coupler"));
echo("───────────────────────────────────────────────────────────────────");
echo(str("Current angle: ", angle, "°"));
echo(str("Pin XZ: (", pin_x(angle), ", ", pin_z(angle), ")"));
echo(str("Slider Z: ", slider_z(angle)));
echo("═══════════════════════════════════════════════════════════════════");
